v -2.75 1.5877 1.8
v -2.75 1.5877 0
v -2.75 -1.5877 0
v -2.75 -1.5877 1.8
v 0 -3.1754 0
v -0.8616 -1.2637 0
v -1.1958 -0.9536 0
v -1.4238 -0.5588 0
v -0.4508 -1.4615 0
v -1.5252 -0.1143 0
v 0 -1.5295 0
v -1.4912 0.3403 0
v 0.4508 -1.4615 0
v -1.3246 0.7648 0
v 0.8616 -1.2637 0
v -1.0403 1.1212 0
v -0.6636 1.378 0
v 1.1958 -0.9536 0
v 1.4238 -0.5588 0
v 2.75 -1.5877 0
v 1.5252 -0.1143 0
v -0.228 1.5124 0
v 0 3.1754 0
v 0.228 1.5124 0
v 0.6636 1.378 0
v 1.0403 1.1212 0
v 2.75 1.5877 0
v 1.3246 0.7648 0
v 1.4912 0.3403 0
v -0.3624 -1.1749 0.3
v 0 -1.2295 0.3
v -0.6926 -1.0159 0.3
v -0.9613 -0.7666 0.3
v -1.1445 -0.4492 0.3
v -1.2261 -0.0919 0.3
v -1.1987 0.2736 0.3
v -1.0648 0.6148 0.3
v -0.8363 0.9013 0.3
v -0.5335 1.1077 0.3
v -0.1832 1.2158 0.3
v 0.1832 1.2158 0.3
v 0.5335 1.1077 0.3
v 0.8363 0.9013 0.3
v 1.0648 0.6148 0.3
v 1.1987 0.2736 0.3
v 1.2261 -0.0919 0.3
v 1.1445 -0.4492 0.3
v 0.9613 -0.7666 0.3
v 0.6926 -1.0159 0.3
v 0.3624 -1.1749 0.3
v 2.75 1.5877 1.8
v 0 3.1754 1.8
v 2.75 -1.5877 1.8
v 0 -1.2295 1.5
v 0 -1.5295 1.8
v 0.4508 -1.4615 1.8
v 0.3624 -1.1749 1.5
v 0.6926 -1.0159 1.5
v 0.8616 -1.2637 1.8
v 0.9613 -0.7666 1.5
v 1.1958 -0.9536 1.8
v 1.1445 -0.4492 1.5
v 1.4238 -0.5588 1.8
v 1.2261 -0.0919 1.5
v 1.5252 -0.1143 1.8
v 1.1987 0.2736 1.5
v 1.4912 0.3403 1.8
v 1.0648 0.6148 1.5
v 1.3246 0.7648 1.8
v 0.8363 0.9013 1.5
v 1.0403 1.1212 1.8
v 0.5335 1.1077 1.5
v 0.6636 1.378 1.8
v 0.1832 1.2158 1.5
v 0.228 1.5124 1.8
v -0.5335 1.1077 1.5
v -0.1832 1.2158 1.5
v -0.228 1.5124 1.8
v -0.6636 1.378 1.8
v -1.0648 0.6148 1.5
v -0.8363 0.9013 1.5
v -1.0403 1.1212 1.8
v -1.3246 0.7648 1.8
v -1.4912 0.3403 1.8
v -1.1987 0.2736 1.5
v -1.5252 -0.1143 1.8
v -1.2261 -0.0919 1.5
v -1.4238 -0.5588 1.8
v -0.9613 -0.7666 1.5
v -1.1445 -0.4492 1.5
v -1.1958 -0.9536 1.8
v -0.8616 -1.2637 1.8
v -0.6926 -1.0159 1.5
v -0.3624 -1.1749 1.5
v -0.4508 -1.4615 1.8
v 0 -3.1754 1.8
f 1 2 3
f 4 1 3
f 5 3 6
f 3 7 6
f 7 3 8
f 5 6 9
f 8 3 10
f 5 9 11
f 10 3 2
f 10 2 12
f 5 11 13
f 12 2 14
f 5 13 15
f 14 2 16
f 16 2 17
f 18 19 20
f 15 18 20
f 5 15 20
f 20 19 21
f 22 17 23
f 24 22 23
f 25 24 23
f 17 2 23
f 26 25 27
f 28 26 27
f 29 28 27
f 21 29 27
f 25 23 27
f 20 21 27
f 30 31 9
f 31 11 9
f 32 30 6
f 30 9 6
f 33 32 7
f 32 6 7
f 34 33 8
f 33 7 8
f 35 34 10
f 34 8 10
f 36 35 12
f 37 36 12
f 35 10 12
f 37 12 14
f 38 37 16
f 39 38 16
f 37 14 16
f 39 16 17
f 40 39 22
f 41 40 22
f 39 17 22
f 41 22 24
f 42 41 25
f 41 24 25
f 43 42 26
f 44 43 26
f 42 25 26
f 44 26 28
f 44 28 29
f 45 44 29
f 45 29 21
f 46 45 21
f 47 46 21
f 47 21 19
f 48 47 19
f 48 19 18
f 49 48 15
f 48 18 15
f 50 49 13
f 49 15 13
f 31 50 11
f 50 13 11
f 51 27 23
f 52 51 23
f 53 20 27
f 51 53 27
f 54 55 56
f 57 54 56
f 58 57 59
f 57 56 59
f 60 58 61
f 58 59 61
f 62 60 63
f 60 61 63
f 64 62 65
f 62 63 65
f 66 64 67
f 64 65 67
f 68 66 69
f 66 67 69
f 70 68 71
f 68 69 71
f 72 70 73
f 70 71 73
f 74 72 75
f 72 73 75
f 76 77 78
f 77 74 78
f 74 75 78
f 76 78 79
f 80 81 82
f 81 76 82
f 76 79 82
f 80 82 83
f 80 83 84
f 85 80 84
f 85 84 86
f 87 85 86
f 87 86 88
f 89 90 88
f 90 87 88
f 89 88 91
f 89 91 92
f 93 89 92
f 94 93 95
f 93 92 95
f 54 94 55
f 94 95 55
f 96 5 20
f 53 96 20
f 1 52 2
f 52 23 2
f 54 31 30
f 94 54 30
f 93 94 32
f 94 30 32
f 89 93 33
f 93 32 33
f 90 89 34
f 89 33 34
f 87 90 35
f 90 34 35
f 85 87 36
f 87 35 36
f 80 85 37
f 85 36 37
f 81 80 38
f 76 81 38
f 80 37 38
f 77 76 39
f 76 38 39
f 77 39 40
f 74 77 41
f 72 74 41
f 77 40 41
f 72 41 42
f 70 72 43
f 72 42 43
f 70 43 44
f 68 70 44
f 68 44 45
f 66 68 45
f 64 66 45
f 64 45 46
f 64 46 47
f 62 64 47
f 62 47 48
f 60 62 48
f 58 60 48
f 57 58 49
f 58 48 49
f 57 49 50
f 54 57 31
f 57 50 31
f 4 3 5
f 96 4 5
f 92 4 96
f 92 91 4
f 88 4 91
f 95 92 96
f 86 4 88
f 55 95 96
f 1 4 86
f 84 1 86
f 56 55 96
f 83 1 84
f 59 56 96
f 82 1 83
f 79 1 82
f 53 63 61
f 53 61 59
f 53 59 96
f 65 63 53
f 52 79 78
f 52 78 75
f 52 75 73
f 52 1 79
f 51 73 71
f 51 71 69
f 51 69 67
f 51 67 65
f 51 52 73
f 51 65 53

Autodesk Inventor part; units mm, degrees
sketch "Sketch1" plane through (0, 0, 0) normal (0, 0, 1) x (1, 0, 0)
  circle A0 centre (0, 0) radius 2.75 construction
  line L0 (-2.75, 1.5877) -> (-2.75, -1.5877)
  line L1 (-2.75, -1.5877) -> (0, -3.1754)
  line L2 (0, -3.1754) -> (2.75, -1.5877)
  line L3 (2.75, -1.5877) -> (2.75, 1.5877)
  line L4 (2.75, 1.5877) -> (0, 3.1754)
  line L5 (0, 3.1754) -> (-2.75, 1.5877)
  line L6 (0, 4.4456) -> (0, -4.4456) projected
  line L7 (-3.85, 0) -> (3.85, 0) projected
  point P0 (0, 0)
  dimension "ParS" = 5.5
extrude "Extrusion1" add sketch "Sketch1" along normal blind 1.8
sketch "Sketch2" plane through (0, 0, 1.8) normal (0, 0, 1) x (1, 0, 0)
  point P0 (0, 0)
  point P1 (0, 0)
hole "Hole1" at (0, 0, 1.8) direction (0, 0, -1) diameter 2.459 end through all thread size "M3x0.5" class "6H" standard "ISO Metric profile"
ref_plane "MSC_PT1" through (0, 0, 1.8) normal (0, 0, 1) x (1, 0, 0)
ref_plane "MSC_PT2" through (0, 0, 0) normal (0, 0, -1) x (-1, 0, 0)
ref_plane "MSC_PF1" through (0, 0, 0) normal (1, 0, 0) x (0, 1, 0)
chamfer "Chamfer1" distance 0.3 angle 45 2 edges at (0, 1.2295, 1.8) (0, 1.2295, 0)
equation "\"d17\" = 0.6 * PTC"
equation "\"d18\" = 0.6 * PTC"
equation "\"d4\" = M"
equation "\"PTC\" = 0.5"
equation "\"NND\" = 3"
equation "\"THREADDIA\" = NND"
properties part number "ISO 4036 - M3" material "Steel, Mild"
